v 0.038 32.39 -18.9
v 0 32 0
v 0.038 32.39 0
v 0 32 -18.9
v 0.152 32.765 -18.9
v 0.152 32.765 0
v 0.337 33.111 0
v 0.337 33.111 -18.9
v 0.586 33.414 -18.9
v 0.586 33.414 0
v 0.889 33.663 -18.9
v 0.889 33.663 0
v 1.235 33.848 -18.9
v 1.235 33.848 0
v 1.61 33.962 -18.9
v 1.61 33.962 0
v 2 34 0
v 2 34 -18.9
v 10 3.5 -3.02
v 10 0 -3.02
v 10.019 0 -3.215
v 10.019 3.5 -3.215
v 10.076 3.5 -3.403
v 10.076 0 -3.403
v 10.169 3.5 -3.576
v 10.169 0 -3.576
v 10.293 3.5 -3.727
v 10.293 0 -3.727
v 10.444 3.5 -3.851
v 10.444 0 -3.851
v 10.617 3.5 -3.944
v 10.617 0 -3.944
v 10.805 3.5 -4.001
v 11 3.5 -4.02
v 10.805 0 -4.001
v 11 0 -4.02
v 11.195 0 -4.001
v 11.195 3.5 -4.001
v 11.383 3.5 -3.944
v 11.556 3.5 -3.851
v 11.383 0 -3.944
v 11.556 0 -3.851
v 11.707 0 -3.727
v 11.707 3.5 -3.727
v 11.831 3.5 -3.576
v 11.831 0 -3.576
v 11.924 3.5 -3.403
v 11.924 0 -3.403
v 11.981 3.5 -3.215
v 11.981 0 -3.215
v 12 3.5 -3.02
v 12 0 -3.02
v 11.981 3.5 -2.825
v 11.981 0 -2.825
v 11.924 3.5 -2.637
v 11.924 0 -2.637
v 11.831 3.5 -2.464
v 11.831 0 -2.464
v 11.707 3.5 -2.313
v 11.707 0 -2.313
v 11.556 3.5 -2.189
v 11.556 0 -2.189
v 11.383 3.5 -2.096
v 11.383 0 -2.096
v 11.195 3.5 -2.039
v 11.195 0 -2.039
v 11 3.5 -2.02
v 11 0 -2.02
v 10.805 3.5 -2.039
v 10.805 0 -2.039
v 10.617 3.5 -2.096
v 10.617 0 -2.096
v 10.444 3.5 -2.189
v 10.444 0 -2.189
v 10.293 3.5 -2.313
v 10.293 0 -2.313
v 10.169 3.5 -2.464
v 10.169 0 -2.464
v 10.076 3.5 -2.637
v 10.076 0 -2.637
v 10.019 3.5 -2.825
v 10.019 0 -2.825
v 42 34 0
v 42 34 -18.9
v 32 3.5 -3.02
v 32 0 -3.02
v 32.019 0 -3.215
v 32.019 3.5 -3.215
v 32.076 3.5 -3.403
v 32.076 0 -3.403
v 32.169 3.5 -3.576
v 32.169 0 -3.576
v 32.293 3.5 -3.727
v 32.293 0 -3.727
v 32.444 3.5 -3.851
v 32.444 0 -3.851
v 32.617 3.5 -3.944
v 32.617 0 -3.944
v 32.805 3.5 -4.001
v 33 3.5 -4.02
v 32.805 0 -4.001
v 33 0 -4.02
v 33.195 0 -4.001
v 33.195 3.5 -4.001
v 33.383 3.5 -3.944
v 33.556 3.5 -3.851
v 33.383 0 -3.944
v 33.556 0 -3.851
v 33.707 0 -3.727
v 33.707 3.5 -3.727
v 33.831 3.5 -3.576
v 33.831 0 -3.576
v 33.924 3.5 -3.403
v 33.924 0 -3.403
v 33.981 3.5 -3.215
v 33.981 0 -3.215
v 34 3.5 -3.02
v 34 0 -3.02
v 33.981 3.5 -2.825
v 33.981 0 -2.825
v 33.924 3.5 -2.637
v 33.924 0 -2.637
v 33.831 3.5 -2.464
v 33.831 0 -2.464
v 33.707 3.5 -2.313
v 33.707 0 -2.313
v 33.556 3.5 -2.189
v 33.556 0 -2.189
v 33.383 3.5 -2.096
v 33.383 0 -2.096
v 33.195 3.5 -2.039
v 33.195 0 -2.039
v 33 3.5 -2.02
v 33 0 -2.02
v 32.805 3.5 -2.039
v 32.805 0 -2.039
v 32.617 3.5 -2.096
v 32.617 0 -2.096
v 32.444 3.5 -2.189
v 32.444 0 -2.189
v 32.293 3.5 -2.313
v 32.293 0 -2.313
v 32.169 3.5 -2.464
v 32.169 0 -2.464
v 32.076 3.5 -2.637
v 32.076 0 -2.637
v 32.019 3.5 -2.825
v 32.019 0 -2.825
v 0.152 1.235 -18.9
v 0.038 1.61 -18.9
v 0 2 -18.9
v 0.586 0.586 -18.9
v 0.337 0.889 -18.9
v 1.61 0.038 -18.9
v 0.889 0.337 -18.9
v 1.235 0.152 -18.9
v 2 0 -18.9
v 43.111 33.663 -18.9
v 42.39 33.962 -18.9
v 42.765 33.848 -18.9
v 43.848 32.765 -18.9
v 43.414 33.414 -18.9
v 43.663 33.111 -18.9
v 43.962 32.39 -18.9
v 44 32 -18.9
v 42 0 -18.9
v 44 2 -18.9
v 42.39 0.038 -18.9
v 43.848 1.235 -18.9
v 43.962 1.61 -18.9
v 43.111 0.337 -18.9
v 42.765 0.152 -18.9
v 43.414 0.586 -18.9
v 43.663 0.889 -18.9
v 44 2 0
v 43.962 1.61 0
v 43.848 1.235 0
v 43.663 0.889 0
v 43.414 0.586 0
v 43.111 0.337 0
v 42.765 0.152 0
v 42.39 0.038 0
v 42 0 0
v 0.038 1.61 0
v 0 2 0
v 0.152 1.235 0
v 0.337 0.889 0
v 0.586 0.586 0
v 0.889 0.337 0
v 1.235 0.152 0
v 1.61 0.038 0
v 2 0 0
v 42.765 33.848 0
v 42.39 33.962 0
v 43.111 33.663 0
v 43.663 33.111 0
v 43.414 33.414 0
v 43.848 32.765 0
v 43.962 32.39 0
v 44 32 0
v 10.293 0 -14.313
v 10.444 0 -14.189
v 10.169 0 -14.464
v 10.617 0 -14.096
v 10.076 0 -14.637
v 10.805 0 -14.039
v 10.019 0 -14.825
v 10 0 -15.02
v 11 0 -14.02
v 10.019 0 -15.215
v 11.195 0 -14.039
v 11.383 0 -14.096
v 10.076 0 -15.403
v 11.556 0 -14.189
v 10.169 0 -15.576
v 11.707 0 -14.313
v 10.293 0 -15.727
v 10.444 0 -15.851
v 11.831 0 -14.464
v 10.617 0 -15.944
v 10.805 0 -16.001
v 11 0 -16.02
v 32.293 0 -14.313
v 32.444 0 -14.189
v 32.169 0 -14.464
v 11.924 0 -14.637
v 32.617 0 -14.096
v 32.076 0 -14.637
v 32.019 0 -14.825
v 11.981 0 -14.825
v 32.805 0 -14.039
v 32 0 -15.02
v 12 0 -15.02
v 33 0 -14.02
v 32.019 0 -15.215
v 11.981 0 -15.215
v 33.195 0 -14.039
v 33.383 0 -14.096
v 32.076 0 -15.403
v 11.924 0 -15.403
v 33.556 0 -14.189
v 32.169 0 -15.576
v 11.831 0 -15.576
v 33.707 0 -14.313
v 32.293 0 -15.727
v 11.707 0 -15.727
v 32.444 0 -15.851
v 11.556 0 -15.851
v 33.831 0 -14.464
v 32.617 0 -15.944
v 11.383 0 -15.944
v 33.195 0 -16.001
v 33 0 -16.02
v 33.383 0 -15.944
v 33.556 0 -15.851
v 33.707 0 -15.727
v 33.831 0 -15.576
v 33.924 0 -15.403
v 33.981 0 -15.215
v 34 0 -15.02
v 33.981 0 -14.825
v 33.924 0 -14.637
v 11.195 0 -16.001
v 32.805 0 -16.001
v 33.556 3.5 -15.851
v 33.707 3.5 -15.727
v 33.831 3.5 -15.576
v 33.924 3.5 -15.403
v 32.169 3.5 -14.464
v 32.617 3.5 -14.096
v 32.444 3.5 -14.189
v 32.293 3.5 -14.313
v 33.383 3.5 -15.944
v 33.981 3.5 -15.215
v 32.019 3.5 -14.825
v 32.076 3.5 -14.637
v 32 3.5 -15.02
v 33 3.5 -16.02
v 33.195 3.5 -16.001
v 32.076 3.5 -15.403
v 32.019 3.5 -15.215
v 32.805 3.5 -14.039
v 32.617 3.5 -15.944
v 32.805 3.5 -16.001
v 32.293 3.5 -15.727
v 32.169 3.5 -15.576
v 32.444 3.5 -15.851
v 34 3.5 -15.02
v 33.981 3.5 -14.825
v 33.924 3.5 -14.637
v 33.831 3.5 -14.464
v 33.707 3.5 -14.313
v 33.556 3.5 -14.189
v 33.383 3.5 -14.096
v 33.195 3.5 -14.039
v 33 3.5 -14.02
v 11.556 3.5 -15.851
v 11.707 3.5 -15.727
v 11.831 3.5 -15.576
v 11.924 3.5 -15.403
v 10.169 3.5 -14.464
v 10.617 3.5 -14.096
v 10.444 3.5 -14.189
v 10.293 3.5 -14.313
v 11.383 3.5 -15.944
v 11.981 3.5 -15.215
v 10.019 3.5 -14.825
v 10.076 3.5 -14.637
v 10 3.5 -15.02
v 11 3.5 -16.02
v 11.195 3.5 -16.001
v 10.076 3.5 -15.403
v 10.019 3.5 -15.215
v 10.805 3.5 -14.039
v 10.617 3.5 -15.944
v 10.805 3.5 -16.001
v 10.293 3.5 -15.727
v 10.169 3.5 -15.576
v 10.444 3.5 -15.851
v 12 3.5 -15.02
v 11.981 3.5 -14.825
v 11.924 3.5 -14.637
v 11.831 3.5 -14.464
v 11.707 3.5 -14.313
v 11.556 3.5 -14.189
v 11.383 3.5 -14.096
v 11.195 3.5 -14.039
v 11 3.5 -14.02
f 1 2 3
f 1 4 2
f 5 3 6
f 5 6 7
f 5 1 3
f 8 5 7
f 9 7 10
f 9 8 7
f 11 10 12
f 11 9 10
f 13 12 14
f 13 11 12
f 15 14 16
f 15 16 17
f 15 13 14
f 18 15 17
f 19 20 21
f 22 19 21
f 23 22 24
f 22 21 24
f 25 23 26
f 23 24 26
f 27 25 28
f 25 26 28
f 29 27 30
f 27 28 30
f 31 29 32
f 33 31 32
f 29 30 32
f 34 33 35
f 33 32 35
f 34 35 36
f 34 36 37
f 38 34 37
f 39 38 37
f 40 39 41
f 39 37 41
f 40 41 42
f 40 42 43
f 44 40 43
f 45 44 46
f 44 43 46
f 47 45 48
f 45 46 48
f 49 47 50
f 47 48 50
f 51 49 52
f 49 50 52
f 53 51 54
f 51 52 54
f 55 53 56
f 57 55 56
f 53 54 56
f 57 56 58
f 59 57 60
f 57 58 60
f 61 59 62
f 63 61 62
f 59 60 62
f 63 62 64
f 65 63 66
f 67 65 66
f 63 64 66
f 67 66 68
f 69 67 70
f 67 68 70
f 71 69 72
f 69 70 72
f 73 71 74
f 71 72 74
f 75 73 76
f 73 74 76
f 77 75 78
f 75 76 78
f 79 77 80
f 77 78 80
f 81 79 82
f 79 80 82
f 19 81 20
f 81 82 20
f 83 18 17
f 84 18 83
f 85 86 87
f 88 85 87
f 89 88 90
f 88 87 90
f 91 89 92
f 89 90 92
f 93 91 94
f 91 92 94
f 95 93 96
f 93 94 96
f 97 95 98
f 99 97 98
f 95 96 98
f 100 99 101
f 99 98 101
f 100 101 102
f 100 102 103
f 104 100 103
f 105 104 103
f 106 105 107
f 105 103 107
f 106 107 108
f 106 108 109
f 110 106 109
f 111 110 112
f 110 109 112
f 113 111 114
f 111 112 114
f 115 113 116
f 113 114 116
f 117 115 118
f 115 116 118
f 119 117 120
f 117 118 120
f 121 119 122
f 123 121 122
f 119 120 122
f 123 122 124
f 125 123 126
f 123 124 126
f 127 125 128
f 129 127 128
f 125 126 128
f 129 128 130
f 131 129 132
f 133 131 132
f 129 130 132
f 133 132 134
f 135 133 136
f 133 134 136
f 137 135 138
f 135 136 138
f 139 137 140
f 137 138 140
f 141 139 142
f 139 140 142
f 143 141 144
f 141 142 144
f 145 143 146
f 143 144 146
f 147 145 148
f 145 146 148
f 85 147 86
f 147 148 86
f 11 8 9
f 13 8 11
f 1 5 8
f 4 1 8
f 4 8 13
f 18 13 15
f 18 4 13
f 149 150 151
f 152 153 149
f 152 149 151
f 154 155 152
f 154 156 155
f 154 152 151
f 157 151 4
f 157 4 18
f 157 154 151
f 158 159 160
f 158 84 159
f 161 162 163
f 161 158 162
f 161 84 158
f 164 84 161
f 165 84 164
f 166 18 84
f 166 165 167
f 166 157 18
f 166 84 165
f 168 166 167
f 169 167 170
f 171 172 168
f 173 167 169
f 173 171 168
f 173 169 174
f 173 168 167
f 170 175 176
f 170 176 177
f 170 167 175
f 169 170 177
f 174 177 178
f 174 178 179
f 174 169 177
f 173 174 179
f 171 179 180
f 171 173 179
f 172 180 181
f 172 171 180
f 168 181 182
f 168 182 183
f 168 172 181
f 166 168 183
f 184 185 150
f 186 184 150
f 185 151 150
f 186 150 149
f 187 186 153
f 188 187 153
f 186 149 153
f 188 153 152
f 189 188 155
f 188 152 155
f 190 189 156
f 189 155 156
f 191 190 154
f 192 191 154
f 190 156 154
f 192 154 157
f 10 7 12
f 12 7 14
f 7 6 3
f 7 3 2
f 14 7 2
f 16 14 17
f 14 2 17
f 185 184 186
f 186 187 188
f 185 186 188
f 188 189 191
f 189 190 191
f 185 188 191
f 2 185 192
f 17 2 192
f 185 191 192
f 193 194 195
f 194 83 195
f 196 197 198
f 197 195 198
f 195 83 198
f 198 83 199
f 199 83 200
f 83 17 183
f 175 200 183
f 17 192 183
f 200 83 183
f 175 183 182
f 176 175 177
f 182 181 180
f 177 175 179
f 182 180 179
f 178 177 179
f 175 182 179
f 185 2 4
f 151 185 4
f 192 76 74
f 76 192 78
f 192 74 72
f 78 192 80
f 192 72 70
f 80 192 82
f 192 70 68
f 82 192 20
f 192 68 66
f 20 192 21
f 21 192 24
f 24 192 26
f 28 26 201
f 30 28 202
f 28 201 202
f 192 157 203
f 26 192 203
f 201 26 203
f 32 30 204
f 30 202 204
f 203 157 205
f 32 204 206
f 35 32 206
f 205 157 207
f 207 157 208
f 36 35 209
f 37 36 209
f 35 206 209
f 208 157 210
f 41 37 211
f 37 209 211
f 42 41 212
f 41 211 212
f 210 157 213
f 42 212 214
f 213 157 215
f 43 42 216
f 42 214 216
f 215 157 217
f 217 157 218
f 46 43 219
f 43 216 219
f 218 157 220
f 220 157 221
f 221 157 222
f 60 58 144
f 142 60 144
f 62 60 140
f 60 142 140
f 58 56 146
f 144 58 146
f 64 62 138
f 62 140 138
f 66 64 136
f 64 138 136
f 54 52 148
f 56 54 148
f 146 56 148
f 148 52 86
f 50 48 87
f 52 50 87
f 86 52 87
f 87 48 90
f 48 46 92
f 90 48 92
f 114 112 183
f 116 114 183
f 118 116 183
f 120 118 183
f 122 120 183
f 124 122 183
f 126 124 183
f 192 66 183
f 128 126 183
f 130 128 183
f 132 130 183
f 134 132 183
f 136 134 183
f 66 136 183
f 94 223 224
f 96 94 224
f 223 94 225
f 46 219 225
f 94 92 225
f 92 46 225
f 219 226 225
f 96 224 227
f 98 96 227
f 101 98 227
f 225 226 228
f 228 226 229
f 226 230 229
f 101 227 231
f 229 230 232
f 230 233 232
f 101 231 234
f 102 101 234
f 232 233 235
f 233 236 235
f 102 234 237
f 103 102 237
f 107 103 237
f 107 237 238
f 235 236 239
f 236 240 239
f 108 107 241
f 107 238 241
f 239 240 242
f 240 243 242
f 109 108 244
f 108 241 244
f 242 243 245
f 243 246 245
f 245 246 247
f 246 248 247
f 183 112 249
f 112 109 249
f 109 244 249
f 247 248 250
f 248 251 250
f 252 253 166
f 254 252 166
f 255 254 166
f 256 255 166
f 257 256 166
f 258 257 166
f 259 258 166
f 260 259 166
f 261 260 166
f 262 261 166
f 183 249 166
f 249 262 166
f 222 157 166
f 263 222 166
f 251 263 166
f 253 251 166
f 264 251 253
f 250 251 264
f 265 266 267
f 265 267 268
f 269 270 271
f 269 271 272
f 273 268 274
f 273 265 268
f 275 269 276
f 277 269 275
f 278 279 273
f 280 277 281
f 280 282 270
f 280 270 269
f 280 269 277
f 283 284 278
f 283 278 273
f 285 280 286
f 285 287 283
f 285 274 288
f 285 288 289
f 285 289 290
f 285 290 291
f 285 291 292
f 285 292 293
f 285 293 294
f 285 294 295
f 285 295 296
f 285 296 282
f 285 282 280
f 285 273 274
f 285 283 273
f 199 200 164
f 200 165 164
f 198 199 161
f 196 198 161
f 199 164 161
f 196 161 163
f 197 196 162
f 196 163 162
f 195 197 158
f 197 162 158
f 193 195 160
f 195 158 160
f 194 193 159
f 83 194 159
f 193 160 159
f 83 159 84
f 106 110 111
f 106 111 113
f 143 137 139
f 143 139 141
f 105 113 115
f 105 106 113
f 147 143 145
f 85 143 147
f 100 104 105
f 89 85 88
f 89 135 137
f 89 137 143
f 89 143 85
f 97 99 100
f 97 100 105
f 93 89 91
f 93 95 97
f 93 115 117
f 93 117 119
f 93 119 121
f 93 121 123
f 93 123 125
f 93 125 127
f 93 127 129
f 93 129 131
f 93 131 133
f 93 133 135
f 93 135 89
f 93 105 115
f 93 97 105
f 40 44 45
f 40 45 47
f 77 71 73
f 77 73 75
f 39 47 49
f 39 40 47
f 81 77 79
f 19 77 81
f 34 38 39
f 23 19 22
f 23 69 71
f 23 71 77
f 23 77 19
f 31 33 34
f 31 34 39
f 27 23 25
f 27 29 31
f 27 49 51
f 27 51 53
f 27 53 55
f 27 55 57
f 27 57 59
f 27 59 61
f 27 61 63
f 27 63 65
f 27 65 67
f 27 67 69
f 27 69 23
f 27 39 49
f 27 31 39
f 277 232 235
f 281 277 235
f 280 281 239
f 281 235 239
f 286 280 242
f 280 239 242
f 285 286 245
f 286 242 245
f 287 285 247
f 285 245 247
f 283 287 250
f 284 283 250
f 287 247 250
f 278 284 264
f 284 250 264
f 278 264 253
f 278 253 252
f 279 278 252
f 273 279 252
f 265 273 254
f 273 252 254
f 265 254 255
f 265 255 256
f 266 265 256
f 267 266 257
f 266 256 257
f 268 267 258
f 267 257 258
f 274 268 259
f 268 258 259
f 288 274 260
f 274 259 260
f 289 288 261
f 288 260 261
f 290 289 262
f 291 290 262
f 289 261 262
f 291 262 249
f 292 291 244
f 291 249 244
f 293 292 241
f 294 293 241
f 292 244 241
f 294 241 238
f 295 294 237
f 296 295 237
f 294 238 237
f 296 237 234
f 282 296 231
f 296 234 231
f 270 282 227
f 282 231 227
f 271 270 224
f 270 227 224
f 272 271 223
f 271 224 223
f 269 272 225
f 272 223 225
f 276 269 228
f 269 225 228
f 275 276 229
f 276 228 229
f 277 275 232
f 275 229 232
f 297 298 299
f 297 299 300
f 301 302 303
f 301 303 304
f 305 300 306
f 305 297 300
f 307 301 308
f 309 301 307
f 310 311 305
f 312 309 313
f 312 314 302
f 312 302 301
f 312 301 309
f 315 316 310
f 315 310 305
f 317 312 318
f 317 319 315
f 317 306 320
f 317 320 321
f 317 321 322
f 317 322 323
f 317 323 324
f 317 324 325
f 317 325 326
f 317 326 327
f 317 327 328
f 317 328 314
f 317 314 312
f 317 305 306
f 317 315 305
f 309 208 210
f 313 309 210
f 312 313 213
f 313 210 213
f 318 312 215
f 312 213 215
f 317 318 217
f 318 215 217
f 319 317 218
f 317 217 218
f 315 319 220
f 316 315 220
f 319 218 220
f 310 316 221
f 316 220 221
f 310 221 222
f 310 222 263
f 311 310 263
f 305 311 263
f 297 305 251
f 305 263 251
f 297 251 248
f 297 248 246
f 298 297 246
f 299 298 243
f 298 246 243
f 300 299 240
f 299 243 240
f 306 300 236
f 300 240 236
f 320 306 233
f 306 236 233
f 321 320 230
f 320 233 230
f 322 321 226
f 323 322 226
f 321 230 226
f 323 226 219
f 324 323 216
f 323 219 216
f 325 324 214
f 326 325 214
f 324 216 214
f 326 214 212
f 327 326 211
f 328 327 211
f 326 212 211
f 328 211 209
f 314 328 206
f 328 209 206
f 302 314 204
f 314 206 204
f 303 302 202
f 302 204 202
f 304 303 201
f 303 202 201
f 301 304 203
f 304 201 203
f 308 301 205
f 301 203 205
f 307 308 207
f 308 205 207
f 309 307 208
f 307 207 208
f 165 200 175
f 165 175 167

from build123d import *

# Parameters (mm, degrees)
SKETCH1_W           = 44
SKETCH1_H           = 18.9
BOSS_EXTRUDE1_DEPTH = 34
FILLET1_R           = 2
SKETCH2_R           = 1
CUT_EXTRUDE1_DEPTH  = 3.5


with BuildPart() as part:
    # Sketch1 → Boss-Extrude1 (new body)
    with BuildSketch(Plane(origin=(0, 0, 0), x_dir=(1, 0, 0), z_dir=(0, 1, 0))):
        with Locations((22, 9.45)):
            Rectangle(SKETCH1_W, SKETCH1_H)
    extrude(amount=BOSS_EXTRUDE1_DEPTH)

    # Fillet1
    fillet1_edges = [part.edges().sort_by_distance(p)[0] for p in [
        (44, 34, -9.45),
        (0, 34, -9.45),
        (44, 0, -9.45),
        (0, 0, -9.45),
    ]]
    fillet(fillet1_edges, radius=FILLET1_R)

    # Sketch2 → Cut-Extrude1 (cut)
    with BuildSketch(Plane(origin=(0, 0, 0), x_dir=(-1, 0, 0), z_dir=(0, -1, 0))):
        with Locations((-11, 3.02)):
            Circle(SKETCH2_R)
        with Locations((-33, 3.02)):
            Circle(SKETCH2_R)
        with Locations((-11, 15.02)):
            Circle(SKETCH2_R)
        with Locations((-33, 15.02)):
            Circle(SKETCH2_R)
    extrude(amount=-CUT_EXTRUDE1_DEPTH, mode=Mode.SUBTRACT)


solid = part.part
